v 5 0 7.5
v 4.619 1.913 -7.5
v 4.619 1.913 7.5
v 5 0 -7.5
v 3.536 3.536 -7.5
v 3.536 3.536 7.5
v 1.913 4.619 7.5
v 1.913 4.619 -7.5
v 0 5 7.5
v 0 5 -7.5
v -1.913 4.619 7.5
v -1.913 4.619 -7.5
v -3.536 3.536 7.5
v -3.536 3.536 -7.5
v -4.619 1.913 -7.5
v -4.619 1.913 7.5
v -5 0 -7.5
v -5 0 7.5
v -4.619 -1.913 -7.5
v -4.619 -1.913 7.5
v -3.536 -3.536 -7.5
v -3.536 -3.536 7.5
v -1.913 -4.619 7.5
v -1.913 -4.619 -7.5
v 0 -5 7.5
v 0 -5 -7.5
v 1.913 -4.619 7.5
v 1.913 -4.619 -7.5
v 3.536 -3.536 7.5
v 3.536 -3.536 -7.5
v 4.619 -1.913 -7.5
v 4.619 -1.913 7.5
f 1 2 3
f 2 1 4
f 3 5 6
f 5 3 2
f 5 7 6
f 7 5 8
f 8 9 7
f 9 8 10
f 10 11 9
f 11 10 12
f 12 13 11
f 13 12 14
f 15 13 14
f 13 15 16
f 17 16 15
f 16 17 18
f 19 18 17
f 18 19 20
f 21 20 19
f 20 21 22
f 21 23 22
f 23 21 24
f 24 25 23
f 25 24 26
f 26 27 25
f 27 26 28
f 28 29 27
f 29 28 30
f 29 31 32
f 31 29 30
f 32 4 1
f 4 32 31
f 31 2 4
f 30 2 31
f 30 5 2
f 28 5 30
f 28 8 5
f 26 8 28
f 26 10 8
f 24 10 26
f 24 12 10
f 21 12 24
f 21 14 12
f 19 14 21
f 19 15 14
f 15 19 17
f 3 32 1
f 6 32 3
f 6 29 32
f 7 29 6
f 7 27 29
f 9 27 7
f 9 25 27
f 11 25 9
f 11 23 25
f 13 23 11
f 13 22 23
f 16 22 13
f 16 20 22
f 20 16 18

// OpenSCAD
// We can create a Cylinder in a similar way
// All units are given in millimeters
// Cylinder with 10mm diameter and 15mm height
cylinder(d = 10, h = 15, center = true);
